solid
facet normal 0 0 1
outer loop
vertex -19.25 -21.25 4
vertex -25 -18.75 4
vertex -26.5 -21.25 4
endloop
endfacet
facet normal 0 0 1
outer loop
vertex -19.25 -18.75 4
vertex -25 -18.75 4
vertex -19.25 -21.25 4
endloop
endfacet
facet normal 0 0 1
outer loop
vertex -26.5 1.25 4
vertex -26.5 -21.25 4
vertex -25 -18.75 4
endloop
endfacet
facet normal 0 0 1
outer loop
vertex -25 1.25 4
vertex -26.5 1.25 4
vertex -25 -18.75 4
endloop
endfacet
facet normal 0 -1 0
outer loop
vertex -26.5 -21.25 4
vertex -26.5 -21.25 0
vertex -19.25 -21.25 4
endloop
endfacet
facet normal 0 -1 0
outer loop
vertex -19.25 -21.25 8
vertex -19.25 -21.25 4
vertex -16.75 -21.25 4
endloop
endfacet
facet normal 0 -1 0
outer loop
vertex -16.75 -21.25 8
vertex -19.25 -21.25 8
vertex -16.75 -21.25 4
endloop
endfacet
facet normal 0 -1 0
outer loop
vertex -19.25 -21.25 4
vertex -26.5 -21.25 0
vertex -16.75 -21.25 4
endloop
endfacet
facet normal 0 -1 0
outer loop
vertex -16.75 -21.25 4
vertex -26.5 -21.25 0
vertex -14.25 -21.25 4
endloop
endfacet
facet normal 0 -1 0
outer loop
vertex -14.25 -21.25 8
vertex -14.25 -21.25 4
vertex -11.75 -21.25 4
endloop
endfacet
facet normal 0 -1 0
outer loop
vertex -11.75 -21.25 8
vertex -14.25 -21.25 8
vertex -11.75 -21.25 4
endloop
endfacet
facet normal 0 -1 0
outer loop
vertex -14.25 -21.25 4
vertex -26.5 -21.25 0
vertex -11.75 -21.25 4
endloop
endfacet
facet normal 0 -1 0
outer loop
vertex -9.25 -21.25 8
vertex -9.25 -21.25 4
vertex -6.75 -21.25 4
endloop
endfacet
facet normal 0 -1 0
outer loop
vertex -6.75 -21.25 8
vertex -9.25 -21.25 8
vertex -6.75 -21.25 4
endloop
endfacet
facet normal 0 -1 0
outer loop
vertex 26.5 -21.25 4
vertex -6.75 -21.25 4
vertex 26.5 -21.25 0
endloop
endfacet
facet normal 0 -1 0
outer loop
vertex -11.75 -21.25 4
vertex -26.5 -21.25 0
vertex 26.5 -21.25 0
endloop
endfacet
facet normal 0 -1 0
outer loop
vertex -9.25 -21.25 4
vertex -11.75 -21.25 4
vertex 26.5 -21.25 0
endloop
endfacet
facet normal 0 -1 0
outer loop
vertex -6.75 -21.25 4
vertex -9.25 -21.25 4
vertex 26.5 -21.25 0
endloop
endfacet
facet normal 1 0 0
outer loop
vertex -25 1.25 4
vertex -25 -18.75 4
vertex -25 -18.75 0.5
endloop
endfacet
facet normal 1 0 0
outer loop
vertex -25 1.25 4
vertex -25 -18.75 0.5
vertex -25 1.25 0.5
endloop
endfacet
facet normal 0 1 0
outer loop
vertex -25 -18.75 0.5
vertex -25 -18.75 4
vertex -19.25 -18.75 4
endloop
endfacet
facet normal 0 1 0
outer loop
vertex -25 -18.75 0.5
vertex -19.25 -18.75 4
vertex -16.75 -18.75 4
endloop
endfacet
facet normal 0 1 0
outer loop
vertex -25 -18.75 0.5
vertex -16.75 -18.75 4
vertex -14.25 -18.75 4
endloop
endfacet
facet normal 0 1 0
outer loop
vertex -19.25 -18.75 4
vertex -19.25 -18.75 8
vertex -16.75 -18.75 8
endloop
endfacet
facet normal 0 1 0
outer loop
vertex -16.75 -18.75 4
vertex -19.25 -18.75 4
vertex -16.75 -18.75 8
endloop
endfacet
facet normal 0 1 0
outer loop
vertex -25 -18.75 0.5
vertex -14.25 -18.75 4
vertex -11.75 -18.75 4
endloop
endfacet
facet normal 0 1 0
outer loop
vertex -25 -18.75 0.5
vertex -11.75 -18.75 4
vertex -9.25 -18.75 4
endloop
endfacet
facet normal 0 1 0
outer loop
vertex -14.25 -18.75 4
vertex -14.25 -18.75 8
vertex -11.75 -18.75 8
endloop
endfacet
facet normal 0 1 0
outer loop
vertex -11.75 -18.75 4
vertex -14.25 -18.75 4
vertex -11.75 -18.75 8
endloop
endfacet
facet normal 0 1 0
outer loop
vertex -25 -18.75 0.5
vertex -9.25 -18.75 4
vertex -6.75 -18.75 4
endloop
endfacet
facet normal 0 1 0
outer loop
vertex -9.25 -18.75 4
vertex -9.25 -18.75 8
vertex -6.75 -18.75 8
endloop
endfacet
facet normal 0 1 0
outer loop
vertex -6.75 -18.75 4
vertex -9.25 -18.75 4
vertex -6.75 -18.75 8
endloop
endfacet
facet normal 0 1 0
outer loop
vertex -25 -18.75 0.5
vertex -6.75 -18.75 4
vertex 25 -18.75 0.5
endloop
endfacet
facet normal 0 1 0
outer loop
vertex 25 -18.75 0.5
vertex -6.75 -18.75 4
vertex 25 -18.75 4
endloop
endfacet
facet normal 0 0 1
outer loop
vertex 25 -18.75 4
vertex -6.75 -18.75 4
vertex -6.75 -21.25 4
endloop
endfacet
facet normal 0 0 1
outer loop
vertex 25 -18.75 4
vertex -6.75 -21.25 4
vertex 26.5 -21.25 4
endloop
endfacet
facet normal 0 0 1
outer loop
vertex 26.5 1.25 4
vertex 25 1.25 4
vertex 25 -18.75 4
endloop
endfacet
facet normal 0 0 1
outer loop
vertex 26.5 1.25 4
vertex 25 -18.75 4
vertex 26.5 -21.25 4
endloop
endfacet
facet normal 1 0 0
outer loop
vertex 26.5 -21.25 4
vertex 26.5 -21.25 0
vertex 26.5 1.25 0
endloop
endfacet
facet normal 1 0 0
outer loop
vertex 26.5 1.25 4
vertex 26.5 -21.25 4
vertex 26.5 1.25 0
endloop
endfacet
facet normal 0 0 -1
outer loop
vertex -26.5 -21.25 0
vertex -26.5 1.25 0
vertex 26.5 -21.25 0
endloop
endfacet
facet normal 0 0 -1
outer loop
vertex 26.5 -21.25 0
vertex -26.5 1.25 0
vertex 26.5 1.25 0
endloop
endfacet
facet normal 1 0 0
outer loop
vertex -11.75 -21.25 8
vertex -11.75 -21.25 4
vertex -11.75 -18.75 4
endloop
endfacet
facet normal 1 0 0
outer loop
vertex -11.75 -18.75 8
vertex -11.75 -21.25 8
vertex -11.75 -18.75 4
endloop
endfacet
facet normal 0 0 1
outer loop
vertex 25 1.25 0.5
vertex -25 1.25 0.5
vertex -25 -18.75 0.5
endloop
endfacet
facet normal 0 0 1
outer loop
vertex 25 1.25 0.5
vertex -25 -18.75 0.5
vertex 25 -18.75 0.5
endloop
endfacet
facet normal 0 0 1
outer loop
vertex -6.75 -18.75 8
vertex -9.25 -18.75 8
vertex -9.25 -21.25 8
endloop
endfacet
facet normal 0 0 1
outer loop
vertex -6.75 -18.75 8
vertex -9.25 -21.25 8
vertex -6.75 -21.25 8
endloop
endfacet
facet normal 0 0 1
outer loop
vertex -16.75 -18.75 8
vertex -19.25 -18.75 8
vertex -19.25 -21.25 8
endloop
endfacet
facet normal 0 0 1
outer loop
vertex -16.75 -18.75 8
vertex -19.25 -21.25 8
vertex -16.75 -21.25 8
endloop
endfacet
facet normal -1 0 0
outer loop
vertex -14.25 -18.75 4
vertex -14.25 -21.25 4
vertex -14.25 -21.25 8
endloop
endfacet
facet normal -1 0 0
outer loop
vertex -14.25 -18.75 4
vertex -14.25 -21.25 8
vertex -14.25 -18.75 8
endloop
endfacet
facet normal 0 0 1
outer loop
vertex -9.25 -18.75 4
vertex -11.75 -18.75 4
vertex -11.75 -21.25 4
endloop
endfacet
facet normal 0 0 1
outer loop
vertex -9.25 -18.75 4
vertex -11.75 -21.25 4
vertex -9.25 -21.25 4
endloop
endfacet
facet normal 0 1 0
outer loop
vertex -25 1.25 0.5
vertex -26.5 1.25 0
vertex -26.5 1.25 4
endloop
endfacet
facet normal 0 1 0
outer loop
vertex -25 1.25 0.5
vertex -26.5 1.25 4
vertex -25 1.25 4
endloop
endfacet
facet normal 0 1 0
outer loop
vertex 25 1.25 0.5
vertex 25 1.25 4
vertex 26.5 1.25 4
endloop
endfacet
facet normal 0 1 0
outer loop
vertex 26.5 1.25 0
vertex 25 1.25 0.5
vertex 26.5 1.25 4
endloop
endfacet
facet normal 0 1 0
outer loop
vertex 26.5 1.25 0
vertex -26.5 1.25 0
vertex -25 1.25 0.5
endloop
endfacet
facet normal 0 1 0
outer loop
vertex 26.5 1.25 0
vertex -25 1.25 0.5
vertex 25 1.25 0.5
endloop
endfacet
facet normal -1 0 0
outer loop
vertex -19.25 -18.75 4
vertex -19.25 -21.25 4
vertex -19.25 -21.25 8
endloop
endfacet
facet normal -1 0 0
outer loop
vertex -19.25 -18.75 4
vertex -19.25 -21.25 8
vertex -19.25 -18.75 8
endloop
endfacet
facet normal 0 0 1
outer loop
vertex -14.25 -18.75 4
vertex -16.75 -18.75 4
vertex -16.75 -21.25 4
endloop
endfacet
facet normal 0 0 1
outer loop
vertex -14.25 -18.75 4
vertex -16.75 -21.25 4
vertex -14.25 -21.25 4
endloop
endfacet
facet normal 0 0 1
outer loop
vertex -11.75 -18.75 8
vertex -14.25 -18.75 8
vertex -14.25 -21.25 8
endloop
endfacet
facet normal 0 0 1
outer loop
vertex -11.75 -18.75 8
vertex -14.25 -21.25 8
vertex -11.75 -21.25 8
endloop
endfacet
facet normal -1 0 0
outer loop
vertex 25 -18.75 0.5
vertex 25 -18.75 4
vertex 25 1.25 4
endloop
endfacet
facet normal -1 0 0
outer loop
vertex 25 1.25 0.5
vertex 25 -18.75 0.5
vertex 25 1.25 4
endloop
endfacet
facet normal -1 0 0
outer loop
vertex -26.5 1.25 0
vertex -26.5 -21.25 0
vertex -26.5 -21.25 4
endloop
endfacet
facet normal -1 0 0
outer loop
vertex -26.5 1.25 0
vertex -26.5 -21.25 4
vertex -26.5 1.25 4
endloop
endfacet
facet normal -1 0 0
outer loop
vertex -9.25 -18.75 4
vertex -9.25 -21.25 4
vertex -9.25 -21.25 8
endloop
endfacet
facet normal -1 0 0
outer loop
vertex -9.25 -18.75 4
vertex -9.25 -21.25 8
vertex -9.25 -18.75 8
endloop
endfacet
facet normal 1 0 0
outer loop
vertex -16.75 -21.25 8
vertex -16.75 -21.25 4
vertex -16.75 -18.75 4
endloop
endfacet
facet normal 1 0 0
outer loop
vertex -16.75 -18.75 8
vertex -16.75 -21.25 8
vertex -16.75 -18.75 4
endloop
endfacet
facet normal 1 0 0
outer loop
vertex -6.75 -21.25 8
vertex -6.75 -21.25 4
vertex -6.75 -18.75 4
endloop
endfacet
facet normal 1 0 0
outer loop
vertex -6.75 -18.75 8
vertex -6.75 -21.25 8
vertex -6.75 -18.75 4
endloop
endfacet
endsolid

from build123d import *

# Parameters (mm, degrees)
SKETCH_W     = 53
SKETCH_H     = 22.5
PAD_DEPTH    = 4
SKETCH001_W  = 50
SKETCH001_H  = 20
POCKET_DEPTH = 3.5
SKETCH002_W  = 2.5
SKETCH002_H  = 2.5
PAD001_DEPTH = 4


with BuildPart() as part:
    # Sketch → Pad (new body)
    with BuildSketch(Plane.XY):
        Rectangle(SKETCH_W, SKETCH_H)
    extrude(amount=PAD_DEPTH)

    # Sketch001 (on Face6 of Pad) → Pocket (cut)
    with BuildSketch(Plane.XY.offset(4)):
        with Locations((0, 1.25)):
            Rectangle(SKETCH001_W, SKETCH001_H)
    extrude(amount=-POCKET_DEPTH, mode=Mode.SUBTRACT)

    # Sketch002 (on Face4 of Pocket) → Pad001 (join)
    with BuildSketch(Plane.XY.offset(4)):
        with Locations((-18, -10)):
            Rectangle(SKETCH002_W, SKETCH002_H)
        with Locations((-13, -10)):
            Rectangle(SKETCH002_W, SKETCH002_H)
        with Locations((-8, -10)):
            Rectangle(SKETCH002_W, SKETCH002_H)
    extrude(amount=PAD001_DEPTH)


with BuildPart() as part_1:
    # Body placement: moved
    add(part.part.moved(Location((0, -10, 0))))


solid = part_1.part
